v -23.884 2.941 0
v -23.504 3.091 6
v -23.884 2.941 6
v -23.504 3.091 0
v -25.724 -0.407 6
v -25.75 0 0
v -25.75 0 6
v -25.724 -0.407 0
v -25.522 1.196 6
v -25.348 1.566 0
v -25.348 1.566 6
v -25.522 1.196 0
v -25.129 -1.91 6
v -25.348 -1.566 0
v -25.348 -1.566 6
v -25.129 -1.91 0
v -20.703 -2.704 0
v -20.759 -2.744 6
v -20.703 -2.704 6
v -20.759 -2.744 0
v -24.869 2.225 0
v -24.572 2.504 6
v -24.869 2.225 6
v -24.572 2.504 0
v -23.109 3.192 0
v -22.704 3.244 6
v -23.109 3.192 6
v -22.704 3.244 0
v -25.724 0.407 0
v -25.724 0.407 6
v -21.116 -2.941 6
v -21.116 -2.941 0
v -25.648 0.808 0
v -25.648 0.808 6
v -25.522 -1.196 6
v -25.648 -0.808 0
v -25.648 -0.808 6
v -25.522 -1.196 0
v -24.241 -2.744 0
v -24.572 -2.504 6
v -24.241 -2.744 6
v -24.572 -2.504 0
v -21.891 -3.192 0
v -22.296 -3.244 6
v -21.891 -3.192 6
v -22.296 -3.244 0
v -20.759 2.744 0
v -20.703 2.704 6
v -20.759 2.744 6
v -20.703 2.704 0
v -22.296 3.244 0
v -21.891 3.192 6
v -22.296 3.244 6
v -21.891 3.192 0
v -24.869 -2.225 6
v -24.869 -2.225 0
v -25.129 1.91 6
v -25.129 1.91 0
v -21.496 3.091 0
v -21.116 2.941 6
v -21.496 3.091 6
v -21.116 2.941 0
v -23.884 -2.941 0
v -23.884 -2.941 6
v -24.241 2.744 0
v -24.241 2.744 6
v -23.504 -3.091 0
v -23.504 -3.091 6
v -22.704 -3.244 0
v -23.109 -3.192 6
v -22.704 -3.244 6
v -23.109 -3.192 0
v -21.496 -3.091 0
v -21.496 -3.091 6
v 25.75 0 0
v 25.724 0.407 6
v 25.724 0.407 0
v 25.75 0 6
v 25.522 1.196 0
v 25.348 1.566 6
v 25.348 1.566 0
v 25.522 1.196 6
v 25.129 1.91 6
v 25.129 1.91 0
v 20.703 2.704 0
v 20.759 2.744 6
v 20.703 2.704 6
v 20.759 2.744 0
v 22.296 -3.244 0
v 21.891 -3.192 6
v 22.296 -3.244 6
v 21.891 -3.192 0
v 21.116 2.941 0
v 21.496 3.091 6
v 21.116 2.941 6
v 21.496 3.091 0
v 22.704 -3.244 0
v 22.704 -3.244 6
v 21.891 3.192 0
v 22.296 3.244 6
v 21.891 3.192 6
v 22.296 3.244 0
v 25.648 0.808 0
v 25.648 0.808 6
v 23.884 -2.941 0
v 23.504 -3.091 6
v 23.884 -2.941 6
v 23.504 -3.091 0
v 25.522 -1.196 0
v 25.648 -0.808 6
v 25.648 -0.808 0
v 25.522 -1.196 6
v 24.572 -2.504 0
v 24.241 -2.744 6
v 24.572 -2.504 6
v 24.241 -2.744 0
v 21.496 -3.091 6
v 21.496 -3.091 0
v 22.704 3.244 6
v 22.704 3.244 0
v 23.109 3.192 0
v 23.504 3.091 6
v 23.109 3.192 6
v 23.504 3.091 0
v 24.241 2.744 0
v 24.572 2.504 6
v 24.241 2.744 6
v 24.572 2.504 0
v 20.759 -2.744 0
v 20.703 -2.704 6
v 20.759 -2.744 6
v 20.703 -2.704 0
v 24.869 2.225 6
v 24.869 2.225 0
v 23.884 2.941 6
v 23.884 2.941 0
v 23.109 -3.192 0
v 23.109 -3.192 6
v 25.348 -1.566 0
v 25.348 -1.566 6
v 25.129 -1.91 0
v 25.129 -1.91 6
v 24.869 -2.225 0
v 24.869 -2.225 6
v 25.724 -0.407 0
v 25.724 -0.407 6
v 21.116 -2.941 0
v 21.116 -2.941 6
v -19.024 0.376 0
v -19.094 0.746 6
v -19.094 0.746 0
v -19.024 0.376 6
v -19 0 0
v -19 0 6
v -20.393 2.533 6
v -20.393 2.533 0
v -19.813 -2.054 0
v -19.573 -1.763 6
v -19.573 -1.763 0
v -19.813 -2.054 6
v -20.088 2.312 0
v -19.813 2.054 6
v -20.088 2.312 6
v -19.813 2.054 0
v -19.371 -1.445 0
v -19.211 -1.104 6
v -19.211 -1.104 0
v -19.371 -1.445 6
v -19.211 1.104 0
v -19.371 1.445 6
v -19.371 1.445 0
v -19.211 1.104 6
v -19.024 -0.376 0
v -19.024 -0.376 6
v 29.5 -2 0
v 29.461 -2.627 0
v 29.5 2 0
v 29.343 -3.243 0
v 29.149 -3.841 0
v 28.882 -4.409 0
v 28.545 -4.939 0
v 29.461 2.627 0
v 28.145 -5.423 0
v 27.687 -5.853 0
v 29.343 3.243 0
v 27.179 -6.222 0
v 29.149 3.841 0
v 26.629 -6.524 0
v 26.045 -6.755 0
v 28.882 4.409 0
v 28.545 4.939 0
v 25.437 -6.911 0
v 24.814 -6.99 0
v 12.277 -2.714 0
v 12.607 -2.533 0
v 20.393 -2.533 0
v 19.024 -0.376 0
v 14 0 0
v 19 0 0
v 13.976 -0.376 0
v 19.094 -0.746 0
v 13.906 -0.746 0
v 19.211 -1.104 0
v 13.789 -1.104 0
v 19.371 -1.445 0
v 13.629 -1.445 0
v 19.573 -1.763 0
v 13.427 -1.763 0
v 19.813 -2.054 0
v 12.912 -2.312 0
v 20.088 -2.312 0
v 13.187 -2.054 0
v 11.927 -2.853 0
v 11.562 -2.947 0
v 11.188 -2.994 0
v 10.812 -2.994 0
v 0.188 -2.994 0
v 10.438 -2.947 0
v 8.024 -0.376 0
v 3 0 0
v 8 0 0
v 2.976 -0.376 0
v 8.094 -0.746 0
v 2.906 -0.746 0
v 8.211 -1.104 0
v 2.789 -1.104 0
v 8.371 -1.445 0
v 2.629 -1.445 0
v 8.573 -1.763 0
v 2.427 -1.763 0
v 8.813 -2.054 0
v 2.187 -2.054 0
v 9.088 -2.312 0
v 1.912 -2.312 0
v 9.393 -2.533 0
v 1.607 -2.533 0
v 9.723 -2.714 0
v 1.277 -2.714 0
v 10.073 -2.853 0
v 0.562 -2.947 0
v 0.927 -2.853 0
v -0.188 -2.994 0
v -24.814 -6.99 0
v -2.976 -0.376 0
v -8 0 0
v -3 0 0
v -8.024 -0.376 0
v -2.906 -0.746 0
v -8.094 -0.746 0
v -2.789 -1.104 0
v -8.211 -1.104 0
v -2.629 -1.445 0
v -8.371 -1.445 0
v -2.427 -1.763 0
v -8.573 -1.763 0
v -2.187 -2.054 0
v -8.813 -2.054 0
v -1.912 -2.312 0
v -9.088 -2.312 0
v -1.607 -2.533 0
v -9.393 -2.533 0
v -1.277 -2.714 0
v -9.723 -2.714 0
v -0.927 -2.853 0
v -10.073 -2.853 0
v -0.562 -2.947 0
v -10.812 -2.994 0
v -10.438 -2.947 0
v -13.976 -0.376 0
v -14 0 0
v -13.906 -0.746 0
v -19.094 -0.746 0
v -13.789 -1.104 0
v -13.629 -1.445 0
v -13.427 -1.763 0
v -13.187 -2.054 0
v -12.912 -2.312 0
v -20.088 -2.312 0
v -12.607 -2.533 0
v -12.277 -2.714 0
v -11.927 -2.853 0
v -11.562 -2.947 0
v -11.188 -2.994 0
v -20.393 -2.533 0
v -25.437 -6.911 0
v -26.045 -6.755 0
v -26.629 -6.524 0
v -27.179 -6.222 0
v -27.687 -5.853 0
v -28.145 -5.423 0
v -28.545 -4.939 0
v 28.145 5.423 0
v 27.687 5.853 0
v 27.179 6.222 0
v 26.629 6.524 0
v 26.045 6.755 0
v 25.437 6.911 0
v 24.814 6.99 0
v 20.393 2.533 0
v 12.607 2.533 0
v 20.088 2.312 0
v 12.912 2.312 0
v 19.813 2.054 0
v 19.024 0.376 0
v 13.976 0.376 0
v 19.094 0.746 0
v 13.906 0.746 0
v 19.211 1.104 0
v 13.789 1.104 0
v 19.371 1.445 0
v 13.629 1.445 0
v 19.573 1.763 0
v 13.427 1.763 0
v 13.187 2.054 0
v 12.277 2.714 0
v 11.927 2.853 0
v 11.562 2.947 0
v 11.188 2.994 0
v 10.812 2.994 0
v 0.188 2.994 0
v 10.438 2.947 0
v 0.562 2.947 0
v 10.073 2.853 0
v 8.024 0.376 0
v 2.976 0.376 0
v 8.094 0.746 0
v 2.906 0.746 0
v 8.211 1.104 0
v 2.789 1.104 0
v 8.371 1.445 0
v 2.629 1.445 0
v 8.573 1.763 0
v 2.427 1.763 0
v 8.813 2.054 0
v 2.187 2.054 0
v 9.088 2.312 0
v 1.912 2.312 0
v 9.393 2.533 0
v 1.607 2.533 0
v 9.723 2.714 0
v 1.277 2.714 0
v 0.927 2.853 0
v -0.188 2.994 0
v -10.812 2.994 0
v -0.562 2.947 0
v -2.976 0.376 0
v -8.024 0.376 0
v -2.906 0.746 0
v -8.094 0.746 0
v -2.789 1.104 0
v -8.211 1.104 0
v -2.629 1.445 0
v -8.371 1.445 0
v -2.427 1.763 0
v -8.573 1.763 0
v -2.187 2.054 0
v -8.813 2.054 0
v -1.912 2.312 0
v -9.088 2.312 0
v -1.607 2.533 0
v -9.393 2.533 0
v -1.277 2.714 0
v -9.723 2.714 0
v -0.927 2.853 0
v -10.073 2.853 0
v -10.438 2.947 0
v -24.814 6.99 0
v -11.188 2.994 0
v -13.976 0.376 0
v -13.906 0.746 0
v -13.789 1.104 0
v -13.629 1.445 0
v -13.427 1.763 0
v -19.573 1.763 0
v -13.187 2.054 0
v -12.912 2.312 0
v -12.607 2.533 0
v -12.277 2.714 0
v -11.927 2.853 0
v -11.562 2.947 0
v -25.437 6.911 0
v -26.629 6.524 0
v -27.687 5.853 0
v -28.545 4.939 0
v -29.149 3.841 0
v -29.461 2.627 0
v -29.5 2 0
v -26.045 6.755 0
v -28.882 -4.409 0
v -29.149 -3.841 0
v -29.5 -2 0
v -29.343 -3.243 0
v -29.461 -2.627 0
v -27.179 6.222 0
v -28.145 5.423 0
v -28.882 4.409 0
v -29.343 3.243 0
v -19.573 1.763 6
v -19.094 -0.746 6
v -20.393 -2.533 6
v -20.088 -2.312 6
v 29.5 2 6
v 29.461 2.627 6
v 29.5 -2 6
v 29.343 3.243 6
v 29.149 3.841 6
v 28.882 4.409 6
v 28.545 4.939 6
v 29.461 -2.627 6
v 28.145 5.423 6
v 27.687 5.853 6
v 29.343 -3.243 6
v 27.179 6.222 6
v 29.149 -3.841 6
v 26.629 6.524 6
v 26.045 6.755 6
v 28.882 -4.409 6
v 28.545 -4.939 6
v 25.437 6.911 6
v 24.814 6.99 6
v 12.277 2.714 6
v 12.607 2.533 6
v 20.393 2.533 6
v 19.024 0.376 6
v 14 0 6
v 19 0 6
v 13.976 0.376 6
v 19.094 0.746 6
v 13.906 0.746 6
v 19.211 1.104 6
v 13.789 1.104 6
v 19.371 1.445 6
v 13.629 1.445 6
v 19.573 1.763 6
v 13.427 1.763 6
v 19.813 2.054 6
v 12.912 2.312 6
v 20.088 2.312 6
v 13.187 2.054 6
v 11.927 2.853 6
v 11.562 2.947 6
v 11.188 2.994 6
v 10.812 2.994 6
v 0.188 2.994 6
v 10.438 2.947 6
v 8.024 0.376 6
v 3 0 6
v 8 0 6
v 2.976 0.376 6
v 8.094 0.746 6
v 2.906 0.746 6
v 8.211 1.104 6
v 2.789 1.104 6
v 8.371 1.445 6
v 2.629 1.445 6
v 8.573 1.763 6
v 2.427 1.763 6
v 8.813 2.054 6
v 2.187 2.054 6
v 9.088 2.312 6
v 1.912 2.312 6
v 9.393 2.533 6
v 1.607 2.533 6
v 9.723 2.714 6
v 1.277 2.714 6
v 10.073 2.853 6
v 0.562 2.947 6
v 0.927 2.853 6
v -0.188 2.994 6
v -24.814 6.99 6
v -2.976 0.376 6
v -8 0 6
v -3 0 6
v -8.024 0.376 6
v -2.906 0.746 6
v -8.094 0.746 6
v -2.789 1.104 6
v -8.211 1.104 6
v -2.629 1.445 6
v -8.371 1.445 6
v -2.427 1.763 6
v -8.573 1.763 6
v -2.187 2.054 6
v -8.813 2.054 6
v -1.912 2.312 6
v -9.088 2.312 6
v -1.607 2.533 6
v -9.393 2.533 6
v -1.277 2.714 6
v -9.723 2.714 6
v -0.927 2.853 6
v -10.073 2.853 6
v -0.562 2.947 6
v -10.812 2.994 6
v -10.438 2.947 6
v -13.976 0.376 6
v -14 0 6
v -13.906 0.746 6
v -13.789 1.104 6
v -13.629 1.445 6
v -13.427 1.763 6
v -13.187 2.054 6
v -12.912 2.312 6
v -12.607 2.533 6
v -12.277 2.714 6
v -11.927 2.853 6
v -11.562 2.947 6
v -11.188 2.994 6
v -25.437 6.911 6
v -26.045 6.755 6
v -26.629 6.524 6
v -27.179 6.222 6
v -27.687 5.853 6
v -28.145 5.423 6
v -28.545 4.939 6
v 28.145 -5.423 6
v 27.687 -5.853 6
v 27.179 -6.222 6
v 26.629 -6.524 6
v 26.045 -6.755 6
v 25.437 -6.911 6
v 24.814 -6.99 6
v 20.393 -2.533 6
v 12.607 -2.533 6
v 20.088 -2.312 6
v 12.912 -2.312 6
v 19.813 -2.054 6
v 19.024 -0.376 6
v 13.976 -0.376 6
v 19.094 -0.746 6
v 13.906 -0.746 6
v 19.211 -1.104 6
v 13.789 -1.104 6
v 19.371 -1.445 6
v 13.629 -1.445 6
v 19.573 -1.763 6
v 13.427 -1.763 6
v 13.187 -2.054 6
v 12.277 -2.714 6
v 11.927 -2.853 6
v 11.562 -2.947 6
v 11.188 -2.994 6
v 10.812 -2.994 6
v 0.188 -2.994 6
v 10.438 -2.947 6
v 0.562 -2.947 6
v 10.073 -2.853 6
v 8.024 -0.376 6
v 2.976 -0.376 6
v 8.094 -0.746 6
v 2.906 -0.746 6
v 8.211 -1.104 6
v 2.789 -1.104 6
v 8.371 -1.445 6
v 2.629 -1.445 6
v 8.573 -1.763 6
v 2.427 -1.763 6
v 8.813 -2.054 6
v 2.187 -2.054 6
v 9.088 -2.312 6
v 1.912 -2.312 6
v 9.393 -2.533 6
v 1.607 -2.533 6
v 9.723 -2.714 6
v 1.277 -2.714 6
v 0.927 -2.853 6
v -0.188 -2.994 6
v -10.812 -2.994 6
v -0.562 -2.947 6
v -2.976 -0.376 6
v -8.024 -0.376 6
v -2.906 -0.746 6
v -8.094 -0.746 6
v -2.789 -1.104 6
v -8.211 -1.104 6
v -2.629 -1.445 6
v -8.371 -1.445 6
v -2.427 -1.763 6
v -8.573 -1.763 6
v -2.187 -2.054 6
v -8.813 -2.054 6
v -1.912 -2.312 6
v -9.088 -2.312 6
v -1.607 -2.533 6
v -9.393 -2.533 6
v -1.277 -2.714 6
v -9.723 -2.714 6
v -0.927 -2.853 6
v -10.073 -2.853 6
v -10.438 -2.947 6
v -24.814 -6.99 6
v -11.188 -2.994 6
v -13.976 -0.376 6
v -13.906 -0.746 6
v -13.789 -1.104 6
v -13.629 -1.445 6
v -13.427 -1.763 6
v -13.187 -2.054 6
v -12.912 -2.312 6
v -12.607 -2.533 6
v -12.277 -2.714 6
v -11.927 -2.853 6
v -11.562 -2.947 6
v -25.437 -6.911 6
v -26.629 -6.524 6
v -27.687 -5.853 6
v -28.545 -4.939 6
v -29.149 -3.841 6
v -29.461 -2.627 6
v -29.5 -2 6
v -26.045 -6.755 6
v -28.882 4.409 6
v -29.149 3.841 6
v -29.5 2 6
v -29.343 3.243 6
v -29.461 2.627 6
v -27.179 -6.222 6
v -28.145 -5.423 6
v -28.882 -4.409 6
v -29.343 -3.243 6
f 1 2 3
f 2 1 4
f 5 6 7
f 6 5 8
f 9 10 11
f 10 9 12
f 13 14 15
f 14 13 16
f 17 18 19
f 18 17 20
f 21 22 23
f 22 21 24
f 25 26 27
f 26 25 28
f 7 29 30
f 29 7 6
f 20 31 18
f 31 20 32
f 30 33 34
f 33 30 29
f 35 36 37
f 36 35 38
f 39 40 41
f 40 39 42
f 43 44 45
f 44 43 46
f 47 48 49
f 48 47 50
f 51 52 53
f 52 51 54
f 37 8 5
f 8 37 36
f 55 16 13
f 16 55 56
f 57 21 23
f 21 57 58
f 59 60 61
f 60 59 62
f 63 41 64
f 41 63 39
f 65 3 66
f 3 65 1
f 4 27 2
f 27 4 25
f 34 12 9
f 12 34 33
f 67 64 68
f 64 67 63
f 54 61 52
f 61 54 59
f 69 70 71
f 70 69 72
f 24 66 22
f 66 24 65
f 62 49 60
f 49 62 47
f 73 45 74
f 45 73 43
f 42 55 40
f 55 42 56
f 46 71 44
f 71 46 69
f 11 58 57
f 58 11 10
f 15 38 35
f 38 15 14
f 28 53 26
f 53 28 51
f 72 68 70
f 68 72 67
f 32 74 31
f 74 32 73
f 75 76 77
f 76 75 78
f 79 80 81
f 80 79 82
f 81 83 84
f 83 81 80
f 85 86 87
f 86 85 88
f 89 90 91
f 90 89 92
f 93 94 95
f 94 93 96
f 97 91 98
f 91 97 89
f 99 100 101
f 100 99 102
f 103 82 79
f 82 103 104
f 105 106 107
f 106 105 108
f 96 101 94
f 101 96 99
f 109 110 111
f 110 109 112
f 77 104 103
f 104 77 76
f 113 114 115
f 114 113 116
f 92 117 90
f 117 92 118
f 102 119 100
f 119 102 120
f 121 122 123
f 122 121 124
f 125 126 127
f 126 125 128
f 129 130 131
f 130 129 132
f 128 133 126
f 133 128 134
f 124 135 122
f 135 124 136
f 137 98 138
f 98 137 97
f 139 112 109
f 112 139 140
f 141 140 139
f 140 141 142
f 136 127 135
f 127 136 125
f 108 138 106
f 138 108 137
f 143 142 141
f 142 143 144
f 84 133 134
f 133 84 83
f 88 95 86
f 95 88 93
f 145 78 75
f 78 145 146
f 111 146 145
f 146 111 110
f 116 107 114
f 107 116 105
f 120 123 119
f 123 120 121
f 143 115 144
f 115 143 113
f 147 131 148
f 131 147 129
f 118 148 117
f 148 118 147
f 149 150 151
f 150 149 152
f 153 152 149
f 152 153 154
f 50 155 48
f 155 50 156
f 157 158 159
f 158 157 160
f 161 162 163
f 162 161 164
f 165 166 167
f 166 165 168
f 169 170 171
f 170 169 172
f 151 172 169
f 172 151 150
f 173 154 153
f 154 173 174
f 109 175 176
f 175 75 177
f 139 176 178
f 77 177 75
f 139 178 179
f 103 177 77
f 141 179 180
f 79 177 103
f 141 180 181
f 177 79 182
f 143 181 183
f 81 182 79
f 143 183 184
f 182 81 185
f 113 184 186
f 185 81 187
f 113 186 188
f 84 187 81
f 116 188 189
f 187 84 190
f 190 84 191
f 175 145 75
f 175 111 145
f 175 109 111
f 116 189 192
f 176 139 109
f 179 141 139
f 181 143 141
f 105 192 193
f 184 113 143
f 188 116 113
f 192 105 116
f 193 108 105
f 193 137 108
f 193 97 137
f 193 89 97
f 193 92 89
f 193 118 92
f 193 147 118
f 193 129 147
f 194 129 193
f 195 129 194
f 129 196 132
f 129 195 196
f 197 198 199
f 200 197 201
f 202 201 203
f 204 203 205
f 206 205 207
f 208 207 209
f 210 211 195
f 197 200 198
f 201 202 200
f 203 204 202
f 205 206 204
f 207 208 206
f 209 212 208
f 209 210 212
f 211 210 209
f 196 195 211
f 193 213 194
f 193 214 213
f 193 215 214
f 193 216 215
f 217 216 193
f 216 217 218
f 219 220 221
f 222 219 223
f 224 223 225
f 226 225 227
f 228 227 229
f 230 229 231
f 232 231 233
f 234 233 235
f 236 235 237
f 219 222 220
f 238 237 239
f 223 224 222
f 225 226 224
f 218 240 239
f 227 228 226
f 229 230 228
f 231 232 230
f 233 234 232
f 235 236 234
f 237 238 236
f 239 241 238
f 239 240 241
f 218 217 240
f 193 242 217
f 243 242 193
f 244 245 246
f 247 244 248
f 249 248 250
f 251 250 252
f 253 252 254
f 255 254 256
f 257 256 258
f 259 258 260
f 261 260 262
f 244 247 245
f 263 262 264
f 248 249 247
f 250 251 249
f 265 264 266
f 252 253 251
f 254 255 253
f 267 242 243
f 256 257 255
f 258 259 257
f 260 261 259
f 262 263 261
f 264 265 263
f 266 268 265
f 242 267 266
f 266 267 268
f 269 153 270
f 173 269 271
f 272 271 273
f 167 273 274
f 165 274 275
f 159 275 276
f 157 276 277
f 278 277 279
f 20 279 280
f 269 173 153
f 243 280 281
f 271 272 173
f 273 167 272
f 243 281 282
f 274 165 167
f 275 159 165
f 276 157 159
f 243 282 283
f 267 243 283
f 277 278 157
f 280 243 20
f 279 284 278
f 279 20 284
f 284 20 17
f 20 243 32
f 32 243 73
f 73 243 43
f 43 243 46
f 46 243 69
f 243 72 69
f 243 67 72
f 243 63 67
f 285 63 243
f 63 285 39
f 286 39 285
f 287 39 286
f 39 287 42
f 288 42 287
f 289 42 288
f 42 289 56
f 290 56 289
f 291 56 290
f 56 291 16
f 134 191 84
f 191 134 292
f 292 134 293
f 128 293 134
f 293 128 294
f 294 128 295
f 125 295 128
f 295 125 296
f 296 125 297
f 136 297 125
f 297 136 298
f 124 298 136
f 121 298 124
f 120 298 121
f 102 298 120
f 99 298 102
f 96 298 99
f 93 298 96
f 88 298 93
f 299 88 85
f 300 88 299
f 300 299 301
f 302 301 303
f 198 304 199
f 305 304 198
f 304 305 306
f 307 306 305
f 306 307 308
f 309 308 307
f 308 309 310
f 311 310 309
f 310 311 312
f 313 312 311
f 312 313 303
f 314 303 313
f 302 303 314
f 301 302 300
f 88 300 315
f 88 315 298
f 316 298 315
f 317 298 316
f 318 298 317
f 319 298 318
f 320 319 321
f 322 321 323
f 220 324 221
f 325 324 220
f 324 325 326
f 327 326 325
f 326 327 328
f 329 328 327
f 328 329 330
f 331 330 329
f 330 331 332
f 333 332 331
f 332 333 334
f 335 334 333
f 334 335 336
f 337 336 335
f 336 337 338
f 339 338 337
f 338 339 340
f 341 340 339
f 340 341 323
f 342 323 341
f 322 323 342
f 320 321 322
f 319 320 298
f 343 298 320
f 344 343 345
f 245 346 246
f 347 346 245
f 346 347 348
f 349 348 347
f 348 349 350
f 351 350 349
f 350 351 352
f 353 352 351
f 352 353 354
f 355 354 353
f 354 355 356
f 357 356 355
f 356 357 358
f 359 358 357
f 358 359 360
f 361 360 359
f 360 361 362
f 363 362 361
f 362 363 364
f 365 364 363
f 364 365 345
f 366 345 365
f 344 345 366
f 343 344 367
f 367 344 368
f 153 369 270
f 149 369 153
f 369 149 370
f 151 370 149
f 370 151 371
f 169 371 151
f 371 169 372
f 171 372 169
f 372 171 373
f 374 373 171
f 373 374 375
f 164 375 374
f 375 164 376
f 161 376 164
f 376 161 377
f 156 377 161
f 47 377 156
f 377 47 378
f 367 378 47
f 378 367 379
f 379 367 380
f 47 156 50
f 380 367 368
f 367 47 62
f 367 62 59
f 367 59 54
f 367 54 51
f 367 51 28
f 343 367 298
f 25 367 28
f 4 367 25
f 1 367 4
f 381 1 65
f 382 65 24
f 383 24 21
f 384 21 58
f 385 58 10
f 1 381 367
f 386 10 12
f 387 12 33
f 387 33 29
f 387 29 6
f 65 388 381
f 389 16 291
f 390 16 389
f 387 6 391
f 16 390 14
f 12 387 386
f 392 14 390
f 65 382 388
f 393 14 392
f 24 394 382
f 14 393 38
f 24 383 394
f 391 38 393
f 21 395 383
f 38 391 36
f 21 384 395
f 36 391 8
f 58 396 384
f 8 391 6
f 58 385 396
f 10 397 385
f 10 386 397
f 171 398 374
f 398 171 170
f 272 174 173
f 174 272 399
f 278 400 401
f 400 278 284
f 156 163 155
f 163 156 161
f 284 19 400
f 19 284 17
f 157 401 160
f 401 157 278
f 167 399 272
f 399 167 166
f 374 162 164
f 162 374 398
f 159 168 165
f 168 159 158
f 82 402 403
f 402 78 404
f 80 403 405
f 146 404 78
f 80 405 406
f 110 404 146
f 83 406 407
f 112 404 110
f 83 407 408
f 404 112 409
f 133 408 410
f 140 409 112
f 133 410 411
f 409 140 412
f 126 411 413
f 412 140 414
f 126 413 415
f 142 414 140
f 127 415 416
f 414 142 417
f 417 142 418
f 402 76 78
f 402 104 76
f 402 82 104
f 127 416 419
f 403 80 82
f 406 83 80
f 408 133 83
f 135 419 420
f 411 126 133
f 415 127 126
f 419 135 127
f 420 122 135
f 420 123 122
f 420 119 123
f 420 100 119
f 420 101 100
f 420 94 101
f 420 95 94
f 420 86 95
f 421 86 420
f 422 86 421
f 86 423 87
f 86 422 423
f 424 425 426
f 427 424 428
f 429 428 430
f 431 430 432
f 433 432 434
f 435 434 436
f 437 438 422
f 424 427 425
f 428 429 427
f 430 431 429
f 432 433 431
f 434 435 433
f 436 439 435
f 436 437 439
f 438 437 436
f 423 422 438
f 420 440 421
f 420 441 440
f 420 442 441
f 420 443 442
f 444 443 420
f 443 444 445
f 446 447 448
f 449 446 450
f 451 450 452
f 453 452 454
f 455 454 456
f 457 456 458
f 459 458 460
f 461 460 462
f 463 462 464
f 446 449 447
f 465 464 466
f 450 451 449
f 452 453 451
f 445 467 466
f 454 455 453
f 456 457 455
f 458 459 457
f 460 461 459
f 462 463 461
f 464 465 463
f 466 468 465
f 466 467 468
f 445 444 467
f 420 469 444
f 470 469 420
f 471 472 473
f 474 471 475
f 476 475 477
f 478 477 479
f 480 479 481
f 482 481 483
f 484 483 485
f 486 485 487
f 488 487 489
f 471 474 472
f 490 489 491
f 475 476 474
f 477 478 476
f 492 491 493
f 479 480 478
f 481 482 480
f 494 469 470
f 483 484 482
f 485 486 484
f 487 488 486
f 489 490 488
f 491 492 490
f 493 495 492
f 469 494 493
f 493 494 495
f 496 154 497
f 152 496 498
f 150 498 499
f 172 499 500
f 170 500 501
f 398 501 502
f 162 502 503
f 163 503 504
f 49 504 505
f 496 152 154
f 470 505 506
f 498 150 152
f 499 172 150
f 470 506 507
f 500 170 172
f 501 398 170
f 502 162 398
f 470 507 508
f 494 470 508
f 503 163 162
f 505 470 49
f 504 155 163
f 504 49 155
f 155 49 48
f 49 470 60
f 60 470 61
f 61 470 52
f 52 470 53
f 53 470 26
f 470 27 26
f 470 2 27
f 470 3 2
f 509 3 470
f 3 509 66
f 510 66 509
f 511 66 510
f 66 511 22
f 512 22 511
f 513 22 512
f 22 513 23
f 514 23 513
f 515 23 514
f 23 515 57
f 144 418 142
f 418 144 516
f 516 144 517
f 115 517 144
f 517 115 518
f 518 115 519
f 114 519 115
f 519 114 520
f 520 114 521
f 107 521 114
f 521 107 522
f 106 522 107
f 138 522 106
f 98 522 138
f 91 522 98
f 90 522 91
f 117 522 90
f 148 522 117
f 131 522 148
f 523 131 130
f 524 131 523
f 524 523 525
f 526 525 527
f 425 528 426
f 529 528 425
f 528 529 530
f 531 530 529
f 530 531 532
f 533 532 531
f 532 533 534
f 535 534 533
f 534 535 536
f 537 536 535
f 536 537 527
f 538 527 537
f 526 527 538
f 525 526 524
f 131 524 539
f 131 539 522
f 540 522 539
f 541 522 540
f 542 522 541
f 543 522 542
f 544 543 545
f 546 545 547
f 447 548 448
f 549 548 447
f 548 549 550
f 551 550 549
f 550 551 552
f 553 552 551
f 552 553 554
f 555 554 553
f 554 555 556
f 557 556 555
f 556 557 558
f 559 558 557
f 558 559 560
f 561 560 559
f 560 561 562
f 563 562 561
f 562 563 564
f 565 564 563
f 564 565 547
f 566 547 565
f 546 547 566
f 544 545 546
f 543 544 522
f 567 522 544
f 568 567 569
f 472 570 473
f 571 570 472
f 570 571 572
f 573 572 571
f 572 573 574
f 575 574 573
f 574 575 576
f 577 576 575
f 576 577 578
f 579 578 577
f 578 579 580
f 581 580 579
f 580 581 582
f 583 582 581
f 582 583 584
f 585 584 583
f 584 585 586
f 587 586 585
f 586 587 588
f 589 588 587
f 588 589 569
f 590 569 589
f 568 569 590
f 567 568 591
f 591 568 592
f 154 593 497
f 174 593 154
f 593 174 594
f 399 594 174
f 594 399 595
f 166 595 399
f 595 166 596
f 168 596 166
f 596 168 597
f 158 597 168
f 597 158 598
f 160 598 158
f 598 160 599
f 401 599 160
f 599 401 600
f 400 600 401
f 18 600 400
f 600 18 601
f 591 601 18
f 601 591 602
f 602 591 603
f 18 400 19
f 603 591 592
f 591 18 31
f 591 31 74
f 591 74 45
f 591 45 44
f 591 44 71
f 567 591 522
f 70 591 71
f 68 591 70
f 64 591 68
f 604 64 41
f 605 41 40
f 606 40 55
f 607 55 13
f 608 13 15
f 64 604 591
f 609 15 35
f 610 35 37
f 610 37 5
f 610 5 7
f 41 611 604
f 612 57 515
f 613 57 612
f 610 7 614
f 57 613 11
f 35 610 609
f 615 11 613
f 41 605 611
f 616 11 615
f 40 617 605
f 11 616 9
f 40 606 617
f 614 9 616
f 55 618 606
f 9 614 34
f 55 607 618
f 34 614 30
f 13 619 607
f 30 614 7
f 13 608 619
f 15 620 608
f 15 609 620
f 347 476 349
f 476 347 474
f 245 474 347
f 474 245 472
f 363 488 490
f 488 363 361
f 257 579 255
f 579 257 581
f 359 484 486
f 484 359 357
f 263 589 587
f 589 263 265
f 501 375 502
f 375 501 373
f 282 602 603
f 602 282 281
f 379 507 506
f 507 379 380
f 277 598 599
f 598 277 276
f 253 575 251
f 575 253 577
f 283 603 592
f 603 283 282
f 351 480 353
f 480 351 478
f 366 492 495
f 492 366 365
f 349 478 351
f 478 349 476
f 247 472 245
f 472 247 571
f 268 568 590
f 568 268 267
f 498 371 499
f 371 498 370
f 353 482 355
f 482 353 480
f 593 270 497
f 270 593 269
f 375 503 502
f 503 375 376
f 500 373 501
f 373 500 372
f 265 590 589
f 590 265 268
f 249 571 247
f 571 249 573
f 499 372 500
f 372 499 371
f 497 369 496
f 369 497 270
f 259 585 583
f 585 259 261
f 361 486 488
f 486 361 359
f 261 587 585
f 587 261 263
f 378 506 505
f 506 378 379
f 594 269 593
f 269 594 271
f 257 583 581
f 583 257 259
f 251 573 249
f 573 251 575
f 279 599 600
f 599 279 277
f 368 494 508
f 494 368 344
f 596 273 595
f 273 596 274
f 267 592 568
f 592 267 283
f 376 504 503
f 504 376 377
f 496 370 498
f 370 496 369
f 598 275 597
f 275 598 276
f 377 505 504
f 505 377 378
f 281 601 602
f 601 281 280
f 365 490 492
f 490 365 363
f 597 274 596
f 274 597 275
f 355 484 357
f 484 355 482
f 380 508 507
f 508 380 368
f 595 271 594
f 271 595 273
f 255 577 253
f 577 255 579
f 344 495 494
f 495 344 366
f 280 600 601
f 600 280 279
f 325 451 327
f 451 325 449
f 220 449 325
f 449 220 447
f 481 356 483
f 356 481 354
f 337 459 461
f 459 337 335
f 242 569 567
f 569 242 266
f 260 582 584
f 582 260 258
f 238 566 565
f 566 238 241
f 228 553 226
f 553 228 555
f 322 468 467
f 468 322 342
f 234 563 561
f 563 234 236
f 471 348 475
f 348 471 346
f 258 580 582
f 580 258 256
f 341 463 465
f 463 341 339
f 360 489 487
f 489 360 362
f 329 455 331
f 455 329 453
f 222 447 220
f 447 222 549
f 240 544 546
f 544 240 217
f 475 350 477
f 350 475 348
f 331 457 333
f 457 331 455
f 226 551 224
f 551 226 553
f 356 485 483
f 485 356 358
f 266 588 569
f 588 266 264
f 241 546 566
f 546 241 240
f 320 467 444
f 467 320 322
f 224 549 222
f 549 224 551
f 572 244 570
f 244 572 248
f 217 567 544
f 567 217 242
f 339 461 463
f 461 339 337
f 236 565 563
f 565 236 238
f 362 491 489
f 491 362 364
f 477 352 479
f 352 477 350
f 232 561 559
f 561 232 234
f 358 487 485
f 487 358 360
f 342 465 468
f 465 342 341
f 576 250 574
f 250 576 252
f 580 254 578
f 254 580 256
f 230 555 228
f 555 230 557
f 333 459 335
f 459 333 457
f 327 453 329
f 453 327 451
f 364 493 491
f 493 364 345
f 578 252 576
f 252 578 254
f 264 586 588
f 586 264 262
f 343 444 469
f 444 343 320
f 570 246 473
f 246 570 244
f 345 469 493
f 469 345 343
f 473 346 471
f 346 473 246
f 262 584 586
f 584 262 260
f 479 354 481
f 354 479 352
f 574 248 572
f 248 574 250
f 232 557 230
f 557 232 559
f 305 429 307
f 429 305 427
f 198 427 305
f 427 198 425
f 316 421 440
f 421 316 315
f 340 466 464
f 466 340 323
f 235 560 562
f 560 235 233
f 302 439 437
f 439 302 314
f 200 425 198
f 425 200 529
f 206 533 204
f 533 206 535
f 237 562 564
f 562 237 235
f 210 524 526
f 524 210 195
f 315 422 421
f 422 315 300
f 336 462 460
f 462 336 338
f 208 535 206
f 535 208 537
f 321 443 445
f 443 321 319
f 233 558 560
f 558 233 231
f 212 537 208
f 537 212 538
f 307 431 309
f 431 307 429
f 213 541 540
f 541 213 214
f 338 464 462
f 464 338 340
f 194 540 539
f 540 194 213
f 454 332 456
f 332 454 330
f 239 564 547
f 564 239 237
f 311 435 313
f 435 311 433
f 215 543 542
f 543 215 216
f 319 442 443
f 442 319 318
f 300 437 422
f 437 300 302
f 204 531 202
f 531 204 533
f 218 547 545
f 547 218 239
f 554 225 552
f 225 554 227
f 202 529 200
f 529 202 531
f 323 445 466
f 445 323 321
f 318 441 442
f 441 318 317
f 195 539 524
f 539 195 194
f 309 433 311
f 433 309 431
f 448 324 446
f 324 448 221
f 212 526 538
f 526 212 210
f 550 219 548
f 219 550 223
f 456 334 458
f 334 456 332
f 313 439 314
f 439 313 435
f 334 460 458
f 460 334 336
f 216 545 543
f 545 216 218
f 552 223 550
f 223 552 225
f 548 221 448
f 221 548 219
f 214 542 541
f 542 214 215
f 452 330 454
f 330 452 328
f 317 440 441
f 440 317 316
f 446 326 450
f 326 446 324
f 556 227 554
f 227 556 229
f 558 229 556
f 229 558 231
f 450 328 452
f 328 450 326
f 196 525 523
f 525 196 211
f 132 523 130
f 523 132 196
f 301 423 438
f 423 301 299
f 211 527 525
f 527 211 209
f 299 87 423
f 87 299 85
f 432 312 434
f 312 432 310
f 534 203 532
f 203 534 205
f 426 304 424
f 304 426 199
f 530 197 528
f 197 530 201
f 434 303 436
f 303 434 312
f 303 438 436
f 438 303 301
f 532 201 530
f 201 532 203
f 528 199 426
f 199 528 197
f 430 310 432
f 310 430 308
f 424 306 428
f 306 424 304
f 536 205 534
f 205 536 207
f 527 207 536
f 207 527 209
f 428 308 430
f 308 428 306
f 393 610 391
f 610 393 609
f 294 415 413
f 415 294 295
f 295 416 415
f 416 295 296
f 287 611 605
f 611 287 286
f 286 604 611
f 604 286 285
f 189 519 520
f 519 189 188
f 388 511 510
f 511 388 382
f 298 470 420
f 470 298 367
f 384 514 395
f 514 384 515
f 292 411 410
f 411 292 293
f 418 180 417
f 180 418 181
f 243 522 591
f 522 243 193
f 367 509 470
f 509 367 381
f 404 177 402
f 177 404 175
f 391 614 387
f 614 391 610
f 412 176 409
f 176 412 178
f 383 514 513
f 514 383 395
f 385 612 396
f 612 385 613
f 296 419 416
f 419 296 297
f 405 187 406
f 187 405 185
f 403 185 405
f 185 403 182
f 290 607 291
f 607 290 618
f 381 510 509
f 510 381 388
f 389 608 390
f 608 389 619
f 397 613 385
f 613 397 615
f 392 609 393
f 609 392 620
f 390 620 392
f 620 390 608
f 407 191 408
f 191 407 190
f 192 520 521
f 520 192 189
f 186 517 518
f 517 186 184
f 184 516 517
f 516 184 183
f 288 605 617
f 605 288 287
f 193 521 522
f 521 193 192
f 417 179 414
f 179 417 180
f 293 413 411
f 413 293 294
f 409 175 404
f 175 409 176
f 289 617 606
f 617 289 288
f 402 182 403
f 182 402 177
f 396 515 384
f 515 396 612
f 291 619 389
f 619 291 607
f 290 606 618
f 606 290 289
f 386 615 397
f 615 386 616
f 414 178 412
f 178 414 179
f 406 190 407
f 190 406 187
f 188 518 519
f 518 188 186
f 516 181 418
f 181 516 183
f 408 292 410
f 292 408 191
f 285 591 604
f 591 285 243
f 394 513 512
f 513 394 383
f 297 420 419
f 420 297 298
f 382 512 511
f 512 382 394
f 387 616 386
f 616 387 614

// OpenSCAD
$fn = 50;

difference() {
	union() {
		hull() {
			translate(v = [-24.5, 2.0, 0]) {
				cylinder(h = 6, r = 5);
			}
			translate(v = [24.5, 2.0, 0]) {
				cylinder(h = 6, r = 5);
			}
			translate(v = [-24.5, -2.0, 0]) {
				cylinder(h = 6, r = 5);
			}
			translate(v = [24.5, -2.0, 0]) {
				cylinder(h = 6, r = 5);
			}
		}
	}
	union() {
		translate(v = [-22.5, 0.0, -100.0]) {
			cylinder(h = 200, r = 3.25);
		}
		translate(v = [22.5, 0.0, -100.0]) {
			cylinder(h = 200, r = 3.25);
		}
		translate(v = [-22.5, 0.0, -100.0]) {
			cylinder(h = 200, r = 1.8);
		}
		translate(v = [22.5, 0.0, -100.0]) {
			cylinder(h = 200, r = 1.8);
		}
		translate(v = [-22.0, 0, 0.0]) {
			cylinder(h = 6, r = 3.0);
		}
		translate(v = [-11.0, 0, 0.0]) {
			cylinder(h = 6, r = 3.0);
		}
		cylinder(h = 6, r = 3.0);
		translate(v = [11.0, 0, 0.0]) {
			cylinder(h = 6, r = 3.0);
		}
		translate(v = [22.0, 0, 0.0]) {
			cylinder(h = 6, r = 3.0);
		}
	}
}
